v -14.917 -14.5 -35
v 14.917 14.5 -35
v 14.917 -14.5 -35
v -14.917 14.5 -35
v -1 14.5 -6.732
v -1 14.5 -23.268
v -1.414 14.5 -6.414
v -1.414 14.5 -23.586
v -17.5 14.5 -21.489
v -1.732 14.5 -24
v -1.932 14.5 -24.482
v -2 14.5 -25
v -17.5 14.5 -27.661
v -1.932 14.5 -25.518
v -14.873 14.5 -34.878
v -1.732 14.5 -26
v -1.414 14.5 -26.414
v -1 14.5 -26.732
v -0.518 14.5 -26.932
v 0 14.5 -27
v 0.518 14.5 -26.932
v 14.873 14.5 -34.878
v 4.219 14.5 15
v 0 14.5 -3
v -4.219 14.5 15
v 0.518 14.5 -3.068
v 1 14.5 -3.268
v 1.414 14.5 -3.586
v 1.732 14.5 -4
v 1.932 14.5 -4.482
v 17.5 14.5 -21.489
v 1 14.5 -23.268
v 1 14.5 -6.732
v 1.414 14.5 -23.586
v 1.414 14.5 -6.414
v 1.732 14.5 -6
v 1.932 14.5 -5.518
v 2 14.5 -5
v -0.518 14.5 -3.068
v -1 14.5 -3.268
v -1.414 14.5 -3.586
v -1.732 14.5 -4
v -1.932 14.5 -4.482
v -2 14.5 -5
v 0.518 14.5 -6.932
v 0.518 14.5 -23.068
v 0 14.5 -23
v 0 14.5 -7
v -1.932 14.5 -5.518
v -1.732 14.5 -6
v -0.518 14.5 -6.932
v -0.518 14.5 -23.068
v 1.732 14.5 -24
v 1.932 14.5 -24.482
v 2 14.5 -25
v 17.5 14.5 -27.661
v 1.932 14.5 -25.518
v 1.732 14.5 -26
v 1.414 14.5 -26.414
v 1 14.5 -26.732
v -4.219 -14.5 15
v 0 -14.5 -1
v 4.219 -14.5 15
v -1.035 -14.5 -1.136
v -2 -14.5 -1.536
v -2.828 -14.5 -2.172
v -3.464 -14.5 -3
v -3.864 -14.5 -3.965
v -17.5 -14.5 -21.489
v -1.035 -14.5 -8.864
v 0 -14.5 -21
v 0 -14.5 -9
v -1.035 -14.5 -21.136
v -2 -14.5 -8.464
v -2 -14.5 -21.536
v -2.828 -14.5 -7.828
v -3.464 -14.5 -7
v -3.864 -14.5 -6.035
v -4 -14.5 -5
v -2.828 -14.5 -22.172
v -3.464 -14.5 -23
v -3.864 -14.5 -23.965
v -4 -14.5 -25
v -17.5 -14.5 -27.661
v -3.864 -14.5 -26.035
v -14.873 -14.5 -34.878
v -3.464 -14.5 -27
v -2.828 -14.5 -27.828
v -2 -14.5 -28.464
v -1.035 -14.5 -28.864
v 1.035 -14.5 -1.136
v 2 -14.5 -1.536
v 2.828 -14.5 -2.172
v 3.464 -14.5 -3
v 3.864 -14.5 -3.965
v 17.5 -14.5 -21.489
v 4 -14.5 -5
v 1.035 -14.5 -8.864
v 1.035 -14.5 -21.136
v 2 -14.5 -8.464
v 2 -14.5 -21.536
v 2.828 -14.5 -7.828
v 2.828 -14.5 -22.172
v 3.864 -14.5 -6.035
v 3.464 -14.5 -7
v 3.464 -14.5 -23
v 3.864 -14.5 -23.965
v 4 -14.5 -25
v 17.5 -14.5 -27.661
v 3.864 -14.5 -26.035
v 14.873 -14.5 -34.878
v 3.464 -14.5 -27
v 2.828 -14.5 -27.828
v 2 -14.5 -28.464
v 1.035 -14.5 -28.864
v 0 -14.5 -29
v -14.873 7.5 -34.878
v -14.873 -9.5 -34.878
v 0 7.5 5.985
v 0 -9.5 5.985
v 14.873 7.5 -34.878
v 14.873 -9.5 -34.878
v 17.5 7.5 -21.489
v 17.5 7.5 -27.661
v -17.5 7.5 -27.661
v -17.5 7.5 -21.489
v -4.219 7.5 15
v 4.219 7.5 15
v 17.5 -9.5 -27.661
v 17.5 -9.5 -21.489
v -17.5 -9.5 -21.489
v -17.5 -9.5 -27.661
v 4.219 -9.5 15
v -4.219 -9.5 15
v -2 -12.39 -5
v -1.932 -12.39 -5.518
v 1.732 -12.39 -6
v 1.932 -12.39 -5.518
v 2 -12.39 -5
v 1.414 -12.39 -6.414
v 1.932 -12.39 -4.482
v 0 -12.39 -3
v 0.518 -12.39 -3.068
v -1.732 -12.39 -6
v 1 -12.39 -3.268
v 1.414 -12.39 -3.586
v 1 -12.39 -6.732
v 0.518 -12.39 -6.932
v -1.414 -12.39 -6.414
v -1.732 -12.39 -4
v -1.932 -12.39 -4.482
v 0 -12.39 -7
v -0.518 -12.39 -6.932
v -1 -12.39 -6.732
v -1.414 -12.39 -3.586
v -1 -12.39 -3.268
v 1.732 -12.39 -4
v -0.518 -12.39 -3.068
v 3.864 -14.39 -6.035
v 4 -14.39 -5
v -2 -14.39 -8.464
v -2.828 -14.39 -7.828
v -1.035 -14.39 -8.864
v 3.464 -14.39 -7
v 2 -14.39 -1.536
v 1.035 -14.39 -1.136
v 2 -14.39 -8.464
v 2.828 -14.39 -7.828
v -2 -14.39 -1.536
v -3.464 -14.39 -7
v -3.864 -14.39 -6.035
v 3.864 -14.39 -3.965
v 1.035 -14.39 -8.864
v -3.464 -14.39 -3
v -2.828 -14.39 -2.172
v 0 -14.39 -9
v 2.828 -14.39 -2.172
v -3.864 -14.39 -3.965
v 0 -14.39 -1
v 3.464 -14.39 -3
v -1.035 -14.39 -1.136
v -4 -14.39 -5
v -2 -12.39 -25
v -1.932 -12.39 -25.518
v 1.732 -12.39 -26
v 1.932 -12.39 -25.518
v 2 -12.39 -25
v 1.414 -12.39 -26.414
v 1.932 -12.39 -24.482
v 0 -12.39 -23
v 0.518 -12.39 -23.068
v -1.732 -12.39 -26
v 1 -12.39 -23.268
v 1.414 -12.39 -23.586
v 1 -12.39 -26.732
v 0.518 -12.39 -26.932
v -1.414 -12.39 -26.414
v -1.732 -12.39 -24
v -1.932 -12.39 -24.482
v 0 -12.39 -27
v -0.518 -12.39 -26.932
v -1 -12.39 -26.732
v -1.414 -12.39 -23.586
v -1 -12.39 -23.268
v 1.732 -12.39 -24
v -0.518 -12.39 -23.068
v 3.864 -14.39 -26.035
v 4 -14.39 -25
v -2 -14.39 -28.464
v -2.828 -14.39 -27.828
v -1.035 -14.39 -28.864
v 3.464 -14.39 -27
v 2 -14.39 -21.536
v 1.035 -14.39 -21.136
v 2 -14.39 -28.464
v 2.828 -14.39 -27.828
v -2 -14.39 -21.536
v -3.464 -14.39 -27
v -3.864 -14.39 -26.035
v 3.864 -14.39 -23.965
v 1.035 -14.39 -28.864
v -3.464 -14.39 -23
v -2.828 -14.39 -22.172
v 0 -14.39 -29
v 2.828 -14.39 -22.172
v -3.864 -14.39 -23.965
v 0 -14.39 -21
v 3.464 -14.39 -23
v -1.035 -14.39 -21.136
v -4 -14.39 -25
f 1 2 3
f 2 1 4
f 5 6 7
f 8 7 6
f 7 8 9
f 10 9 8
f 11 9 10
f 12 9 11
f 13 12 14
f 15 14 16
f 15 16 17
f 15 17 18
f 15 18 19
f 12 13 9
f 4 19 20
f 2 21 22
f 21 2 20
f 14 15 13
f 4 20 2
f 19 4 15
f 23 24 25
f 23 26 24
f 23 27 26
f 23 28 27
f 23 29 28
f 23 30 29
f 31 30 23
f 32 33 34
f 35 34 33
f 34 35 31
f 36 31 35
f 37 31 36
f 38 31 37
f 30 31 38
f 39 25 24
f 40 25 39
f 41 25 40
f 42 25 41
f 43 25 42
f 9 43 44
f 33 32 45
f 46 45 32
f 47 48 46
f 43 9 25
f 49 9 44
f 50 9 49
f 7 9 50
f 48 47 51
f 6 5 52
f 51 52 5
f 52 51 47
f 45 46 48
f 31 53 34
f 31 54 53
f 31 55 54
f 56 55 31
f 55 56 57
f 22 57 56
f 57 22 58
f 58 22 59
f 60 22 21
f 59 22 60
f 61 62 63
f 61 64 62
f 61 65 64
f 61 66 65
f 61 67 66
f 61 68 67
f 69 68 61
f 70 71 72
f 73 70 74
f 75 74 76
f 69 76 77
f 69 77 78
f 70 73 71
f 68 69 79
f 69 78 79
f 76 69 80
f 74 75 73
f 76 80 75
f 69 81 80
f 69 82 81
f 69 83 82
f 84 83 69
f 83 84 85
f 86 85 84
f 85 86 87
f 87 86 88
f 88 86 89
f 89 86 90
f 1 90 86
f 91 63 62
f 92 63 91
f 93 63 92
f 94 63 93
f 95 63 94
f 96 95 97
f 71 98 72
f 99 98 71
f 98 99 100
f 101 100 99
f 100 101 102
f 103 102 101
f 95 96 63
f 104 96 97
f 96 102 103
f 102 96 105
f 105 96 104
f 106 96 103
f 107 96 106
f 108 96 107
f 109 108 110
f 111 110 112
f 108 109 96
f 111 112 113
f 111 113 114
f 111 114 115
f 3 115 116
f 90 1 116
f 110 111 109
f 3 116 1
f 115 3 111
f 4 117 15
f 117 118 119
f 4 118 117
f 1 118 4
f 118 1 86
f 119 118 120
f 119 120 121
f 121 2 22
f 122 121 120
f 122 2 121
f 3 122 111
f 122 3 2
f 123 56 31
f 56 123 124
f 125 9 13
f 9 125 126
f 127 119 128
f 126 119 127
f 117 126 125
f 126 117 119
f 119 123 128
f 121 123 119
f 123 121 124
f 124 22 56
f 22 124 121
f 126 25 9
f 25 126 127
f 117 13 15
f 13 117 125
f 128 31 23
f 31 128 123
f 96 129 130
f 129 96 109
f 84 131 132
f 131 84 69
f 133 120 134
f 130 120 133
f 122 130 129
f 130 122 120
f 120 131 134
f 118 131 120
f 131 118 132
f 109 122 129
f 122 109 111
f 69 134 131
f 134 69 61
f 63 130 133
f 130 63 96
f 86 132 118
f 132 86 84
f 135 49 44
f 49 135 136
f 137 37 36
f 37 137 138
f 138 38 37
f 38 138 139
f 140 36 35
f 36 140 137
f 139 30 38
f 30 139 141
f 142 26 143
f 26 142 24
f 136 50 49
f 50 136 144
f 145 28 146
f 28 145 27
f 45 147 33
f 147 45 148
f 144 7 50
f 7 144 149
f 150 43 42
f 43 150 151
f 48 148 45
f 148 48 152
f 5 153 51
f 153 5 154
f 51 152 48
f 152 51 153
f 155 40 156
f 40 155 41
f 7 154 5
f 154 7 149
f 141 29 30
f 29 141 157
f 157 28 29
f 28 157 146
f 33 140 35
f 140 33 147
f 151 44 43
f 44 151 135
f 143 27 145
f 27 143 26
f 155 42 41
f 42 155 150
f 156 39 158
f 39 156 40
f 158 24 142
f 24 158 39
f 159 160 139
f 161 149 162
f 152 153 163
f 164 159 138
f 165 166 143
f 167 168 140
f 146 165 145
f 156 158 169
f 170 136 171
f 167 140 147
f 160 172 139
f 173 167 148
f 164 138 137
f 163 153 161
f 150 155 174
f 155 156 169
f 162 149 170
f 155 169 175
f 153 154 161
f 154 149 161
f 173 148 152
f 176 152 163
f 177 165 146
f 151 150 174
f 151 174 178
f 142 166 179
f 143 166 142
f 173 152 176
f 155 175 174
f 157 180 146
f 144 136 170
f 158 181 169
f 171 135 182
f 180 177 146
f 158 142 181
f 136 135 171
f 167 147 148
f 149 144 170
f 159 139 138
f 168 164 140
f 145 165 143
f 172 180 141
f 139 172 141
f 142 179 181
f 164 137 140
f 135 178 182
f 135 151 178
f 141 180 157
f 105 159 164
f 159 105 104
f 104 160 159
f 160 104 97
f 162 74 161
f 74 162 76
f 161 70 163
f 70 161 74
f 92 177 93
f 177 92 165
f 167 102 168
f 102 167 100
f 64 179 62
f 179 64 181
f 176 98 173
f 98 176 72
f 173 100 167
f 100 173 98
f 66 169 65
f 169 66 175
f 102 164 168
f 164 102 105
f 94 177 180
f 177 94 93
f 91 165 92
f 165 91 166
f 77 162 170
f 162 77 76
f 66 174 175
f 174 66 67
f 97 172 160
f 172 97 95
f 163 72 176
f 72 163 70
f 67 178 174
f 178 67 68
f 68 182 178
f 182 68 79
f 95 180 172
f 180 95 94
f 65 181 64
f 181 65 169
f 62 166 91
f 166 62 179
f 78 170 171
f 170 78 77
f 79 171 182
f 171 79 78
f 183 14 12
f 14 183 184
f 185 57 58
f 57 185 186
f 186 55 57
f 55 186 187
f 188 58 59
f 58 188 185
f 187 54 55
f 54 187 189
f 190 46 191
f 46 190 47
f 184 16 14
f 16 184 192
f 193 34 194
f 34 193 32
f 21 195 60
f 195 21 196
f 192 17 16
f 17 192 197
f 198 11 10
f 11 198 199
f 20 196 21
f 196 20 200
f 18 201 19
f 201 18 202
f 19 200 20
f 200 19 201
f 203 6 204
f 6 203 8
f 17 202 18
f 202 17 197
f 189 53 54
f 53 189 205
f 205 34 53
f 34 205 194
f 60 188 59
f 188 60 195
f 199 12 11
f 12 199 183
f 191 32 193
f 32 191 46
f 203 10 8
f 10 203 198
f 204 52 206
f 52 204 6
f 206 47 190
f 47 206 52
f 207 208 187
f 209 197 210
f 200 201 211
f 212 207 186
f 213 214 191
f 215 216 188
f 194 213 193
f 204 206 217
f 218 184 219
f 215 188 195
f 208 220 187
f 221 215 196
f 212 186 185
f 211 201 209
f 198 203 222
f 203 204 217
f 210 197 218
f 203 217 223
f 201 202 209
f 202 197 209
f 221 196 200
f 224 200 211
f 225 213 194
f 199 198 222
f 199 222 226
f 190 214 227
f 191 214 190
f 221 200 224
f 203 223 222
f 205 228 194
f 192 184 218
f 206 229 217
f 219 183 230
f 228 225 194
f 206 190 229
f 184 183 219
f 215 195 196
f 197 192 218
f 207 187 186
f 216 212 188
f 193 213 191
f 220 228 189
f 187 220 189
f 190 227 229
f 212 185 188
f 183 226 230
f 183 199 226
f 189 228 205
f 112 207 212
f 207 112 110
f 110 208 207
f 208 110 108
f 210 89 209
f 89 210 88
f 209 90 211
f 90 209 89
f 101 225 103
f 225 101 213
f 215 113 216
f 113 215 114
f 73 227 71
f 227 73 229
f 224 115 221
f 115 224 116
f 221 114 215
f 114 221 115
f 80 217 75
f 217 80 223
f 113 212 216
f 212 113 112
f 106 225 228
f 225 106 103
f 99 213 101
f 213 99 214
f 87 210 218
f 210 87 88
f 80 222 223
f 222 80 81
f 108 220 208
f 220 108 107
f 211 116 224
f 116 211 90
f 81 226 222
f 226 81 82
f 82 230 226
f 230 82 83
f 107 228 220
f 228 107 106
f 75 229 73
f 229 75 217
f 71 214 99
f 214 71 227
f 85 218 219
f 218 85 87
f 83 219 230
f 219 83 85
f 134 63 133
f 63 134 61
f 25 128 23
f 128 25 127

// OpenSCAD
// Flush cutter holder 3D Design

// Copyright (c) 2014 by Jeremy Bennett <jeremy.bennett@embecosm.com>

// Flush cutter holder 3D Design is licensed under a Creative Commons
// Attribution-ShareAlike 3.0 Unported License.

// You should have received a copy of the license along with this work.  If not, 
// see <http://creativecommons.org/licenses/by-sa/3.0/>.

// -----------------------------------------------------------------------------

// A screw hole with a countersink
module screwhole (bore, length) {
	iota = length / 100;
	half_length = length / 2 + iota;
	full_length = half_length * 2;
	union () {
		cylinder (d = bore, h = full_length, center = true, $fn = 24);
		translate (v = [0, 0, -half_length + bore / 4 + bore / 10])
			cylinder (d1 = bore * 2, d2 = bore, h = bore / 2, center = true, $fn = 24);
		translate (v = [0, 0, -half_length + bore / 20])
			cylinder (d = bore * 2, h = bore / 10, center = true, $fn = 24);
	}
}


// A screw hole for a screw parallel with the Y axis
module screwhole_y (bore, length, x_off, z_off) {
	iota = length / 100;
	translate (v = [x_off, 0, z_off])
		rotate (a = [-90, 0, 0])
			screwhole (bore = bore, length = length);
}


// Produce a curved wedge shape

// @param r_outer   Outer radius
// @param r_inner   Inner radius
// @param edge_off  Offset of sloping sides from radius
// @param tilt      Angle of radii for edges
// @param y_thick   Thickness in the Y direction
// @param y_off     Offset in the Y direction
module wedge (r_outer, r_inner, edge_off, tilt, y_thick, y_off) {
	iota = y_thick / 10;
	half_base = r_outer * sin (tilt);
	height = r_outer * cos (tilt);
   x_thick = r_outer;
	len = r_outer * 4;
	translate (v = [0, y_off, 0])
		difference () {
			intersection () {
				cube (size = [x_thick, y_thick, r_outer * 2], center = true);
				translate (v = [x_thick / 2 * cos (tilt) - edge_off, 0, 0])
					rotate (a = [0, tilt, 0])
						cube (size = [x_thick, y_thick, len], center = true);
				translate (v = [-x_thick / 2 * cos (tilt) + edge_off, 0, 0])
					rotate (a = [0, -tilt, 0])
						cube (size = [x_thick, y_thick, len], center = true);
			}
			cube (size = [x_thick, y_thick + iota, r_inner * 2], center = true);
		}
}


// The actual support
module strip_support () {
	outer = 35;
	inner = 0;
	tilt = 20;
	inner_width = 17;
	off = 7.5;
	iota = 0.1;
	difference () {
		union () {
			wedge (r_outer = outer, r_inner = inner, edge_off = 0, tilt = tilt,
			             y_thick = inner_width + 12, y_off = 0);
			wedge (r_outer = outer, r_inner = inner, edge_off = off, tilt = tilt,
			             y_thick = 7, y_off = (inner_width + 5) / 2);
			wedge (r_outer = outer, r_inner = inner, edge_off = off, tilt = tilt,
			             y_thick = 5, y_off = -(inner_width + 7) / 2);
		}
		screwhole_y (bore = 4, length = inner_width + 12, x_off = 0,
		             z_off = -5);
		screwhole_y (bore = 4, length = inner_width + 12, x_off = 0,
		             z_off = -25);
		translate (v = [0, 0, 25])
			cube (size = [outer, inner_width + 12 + iota, 20], center = true);
	}
}


strip_support ();
